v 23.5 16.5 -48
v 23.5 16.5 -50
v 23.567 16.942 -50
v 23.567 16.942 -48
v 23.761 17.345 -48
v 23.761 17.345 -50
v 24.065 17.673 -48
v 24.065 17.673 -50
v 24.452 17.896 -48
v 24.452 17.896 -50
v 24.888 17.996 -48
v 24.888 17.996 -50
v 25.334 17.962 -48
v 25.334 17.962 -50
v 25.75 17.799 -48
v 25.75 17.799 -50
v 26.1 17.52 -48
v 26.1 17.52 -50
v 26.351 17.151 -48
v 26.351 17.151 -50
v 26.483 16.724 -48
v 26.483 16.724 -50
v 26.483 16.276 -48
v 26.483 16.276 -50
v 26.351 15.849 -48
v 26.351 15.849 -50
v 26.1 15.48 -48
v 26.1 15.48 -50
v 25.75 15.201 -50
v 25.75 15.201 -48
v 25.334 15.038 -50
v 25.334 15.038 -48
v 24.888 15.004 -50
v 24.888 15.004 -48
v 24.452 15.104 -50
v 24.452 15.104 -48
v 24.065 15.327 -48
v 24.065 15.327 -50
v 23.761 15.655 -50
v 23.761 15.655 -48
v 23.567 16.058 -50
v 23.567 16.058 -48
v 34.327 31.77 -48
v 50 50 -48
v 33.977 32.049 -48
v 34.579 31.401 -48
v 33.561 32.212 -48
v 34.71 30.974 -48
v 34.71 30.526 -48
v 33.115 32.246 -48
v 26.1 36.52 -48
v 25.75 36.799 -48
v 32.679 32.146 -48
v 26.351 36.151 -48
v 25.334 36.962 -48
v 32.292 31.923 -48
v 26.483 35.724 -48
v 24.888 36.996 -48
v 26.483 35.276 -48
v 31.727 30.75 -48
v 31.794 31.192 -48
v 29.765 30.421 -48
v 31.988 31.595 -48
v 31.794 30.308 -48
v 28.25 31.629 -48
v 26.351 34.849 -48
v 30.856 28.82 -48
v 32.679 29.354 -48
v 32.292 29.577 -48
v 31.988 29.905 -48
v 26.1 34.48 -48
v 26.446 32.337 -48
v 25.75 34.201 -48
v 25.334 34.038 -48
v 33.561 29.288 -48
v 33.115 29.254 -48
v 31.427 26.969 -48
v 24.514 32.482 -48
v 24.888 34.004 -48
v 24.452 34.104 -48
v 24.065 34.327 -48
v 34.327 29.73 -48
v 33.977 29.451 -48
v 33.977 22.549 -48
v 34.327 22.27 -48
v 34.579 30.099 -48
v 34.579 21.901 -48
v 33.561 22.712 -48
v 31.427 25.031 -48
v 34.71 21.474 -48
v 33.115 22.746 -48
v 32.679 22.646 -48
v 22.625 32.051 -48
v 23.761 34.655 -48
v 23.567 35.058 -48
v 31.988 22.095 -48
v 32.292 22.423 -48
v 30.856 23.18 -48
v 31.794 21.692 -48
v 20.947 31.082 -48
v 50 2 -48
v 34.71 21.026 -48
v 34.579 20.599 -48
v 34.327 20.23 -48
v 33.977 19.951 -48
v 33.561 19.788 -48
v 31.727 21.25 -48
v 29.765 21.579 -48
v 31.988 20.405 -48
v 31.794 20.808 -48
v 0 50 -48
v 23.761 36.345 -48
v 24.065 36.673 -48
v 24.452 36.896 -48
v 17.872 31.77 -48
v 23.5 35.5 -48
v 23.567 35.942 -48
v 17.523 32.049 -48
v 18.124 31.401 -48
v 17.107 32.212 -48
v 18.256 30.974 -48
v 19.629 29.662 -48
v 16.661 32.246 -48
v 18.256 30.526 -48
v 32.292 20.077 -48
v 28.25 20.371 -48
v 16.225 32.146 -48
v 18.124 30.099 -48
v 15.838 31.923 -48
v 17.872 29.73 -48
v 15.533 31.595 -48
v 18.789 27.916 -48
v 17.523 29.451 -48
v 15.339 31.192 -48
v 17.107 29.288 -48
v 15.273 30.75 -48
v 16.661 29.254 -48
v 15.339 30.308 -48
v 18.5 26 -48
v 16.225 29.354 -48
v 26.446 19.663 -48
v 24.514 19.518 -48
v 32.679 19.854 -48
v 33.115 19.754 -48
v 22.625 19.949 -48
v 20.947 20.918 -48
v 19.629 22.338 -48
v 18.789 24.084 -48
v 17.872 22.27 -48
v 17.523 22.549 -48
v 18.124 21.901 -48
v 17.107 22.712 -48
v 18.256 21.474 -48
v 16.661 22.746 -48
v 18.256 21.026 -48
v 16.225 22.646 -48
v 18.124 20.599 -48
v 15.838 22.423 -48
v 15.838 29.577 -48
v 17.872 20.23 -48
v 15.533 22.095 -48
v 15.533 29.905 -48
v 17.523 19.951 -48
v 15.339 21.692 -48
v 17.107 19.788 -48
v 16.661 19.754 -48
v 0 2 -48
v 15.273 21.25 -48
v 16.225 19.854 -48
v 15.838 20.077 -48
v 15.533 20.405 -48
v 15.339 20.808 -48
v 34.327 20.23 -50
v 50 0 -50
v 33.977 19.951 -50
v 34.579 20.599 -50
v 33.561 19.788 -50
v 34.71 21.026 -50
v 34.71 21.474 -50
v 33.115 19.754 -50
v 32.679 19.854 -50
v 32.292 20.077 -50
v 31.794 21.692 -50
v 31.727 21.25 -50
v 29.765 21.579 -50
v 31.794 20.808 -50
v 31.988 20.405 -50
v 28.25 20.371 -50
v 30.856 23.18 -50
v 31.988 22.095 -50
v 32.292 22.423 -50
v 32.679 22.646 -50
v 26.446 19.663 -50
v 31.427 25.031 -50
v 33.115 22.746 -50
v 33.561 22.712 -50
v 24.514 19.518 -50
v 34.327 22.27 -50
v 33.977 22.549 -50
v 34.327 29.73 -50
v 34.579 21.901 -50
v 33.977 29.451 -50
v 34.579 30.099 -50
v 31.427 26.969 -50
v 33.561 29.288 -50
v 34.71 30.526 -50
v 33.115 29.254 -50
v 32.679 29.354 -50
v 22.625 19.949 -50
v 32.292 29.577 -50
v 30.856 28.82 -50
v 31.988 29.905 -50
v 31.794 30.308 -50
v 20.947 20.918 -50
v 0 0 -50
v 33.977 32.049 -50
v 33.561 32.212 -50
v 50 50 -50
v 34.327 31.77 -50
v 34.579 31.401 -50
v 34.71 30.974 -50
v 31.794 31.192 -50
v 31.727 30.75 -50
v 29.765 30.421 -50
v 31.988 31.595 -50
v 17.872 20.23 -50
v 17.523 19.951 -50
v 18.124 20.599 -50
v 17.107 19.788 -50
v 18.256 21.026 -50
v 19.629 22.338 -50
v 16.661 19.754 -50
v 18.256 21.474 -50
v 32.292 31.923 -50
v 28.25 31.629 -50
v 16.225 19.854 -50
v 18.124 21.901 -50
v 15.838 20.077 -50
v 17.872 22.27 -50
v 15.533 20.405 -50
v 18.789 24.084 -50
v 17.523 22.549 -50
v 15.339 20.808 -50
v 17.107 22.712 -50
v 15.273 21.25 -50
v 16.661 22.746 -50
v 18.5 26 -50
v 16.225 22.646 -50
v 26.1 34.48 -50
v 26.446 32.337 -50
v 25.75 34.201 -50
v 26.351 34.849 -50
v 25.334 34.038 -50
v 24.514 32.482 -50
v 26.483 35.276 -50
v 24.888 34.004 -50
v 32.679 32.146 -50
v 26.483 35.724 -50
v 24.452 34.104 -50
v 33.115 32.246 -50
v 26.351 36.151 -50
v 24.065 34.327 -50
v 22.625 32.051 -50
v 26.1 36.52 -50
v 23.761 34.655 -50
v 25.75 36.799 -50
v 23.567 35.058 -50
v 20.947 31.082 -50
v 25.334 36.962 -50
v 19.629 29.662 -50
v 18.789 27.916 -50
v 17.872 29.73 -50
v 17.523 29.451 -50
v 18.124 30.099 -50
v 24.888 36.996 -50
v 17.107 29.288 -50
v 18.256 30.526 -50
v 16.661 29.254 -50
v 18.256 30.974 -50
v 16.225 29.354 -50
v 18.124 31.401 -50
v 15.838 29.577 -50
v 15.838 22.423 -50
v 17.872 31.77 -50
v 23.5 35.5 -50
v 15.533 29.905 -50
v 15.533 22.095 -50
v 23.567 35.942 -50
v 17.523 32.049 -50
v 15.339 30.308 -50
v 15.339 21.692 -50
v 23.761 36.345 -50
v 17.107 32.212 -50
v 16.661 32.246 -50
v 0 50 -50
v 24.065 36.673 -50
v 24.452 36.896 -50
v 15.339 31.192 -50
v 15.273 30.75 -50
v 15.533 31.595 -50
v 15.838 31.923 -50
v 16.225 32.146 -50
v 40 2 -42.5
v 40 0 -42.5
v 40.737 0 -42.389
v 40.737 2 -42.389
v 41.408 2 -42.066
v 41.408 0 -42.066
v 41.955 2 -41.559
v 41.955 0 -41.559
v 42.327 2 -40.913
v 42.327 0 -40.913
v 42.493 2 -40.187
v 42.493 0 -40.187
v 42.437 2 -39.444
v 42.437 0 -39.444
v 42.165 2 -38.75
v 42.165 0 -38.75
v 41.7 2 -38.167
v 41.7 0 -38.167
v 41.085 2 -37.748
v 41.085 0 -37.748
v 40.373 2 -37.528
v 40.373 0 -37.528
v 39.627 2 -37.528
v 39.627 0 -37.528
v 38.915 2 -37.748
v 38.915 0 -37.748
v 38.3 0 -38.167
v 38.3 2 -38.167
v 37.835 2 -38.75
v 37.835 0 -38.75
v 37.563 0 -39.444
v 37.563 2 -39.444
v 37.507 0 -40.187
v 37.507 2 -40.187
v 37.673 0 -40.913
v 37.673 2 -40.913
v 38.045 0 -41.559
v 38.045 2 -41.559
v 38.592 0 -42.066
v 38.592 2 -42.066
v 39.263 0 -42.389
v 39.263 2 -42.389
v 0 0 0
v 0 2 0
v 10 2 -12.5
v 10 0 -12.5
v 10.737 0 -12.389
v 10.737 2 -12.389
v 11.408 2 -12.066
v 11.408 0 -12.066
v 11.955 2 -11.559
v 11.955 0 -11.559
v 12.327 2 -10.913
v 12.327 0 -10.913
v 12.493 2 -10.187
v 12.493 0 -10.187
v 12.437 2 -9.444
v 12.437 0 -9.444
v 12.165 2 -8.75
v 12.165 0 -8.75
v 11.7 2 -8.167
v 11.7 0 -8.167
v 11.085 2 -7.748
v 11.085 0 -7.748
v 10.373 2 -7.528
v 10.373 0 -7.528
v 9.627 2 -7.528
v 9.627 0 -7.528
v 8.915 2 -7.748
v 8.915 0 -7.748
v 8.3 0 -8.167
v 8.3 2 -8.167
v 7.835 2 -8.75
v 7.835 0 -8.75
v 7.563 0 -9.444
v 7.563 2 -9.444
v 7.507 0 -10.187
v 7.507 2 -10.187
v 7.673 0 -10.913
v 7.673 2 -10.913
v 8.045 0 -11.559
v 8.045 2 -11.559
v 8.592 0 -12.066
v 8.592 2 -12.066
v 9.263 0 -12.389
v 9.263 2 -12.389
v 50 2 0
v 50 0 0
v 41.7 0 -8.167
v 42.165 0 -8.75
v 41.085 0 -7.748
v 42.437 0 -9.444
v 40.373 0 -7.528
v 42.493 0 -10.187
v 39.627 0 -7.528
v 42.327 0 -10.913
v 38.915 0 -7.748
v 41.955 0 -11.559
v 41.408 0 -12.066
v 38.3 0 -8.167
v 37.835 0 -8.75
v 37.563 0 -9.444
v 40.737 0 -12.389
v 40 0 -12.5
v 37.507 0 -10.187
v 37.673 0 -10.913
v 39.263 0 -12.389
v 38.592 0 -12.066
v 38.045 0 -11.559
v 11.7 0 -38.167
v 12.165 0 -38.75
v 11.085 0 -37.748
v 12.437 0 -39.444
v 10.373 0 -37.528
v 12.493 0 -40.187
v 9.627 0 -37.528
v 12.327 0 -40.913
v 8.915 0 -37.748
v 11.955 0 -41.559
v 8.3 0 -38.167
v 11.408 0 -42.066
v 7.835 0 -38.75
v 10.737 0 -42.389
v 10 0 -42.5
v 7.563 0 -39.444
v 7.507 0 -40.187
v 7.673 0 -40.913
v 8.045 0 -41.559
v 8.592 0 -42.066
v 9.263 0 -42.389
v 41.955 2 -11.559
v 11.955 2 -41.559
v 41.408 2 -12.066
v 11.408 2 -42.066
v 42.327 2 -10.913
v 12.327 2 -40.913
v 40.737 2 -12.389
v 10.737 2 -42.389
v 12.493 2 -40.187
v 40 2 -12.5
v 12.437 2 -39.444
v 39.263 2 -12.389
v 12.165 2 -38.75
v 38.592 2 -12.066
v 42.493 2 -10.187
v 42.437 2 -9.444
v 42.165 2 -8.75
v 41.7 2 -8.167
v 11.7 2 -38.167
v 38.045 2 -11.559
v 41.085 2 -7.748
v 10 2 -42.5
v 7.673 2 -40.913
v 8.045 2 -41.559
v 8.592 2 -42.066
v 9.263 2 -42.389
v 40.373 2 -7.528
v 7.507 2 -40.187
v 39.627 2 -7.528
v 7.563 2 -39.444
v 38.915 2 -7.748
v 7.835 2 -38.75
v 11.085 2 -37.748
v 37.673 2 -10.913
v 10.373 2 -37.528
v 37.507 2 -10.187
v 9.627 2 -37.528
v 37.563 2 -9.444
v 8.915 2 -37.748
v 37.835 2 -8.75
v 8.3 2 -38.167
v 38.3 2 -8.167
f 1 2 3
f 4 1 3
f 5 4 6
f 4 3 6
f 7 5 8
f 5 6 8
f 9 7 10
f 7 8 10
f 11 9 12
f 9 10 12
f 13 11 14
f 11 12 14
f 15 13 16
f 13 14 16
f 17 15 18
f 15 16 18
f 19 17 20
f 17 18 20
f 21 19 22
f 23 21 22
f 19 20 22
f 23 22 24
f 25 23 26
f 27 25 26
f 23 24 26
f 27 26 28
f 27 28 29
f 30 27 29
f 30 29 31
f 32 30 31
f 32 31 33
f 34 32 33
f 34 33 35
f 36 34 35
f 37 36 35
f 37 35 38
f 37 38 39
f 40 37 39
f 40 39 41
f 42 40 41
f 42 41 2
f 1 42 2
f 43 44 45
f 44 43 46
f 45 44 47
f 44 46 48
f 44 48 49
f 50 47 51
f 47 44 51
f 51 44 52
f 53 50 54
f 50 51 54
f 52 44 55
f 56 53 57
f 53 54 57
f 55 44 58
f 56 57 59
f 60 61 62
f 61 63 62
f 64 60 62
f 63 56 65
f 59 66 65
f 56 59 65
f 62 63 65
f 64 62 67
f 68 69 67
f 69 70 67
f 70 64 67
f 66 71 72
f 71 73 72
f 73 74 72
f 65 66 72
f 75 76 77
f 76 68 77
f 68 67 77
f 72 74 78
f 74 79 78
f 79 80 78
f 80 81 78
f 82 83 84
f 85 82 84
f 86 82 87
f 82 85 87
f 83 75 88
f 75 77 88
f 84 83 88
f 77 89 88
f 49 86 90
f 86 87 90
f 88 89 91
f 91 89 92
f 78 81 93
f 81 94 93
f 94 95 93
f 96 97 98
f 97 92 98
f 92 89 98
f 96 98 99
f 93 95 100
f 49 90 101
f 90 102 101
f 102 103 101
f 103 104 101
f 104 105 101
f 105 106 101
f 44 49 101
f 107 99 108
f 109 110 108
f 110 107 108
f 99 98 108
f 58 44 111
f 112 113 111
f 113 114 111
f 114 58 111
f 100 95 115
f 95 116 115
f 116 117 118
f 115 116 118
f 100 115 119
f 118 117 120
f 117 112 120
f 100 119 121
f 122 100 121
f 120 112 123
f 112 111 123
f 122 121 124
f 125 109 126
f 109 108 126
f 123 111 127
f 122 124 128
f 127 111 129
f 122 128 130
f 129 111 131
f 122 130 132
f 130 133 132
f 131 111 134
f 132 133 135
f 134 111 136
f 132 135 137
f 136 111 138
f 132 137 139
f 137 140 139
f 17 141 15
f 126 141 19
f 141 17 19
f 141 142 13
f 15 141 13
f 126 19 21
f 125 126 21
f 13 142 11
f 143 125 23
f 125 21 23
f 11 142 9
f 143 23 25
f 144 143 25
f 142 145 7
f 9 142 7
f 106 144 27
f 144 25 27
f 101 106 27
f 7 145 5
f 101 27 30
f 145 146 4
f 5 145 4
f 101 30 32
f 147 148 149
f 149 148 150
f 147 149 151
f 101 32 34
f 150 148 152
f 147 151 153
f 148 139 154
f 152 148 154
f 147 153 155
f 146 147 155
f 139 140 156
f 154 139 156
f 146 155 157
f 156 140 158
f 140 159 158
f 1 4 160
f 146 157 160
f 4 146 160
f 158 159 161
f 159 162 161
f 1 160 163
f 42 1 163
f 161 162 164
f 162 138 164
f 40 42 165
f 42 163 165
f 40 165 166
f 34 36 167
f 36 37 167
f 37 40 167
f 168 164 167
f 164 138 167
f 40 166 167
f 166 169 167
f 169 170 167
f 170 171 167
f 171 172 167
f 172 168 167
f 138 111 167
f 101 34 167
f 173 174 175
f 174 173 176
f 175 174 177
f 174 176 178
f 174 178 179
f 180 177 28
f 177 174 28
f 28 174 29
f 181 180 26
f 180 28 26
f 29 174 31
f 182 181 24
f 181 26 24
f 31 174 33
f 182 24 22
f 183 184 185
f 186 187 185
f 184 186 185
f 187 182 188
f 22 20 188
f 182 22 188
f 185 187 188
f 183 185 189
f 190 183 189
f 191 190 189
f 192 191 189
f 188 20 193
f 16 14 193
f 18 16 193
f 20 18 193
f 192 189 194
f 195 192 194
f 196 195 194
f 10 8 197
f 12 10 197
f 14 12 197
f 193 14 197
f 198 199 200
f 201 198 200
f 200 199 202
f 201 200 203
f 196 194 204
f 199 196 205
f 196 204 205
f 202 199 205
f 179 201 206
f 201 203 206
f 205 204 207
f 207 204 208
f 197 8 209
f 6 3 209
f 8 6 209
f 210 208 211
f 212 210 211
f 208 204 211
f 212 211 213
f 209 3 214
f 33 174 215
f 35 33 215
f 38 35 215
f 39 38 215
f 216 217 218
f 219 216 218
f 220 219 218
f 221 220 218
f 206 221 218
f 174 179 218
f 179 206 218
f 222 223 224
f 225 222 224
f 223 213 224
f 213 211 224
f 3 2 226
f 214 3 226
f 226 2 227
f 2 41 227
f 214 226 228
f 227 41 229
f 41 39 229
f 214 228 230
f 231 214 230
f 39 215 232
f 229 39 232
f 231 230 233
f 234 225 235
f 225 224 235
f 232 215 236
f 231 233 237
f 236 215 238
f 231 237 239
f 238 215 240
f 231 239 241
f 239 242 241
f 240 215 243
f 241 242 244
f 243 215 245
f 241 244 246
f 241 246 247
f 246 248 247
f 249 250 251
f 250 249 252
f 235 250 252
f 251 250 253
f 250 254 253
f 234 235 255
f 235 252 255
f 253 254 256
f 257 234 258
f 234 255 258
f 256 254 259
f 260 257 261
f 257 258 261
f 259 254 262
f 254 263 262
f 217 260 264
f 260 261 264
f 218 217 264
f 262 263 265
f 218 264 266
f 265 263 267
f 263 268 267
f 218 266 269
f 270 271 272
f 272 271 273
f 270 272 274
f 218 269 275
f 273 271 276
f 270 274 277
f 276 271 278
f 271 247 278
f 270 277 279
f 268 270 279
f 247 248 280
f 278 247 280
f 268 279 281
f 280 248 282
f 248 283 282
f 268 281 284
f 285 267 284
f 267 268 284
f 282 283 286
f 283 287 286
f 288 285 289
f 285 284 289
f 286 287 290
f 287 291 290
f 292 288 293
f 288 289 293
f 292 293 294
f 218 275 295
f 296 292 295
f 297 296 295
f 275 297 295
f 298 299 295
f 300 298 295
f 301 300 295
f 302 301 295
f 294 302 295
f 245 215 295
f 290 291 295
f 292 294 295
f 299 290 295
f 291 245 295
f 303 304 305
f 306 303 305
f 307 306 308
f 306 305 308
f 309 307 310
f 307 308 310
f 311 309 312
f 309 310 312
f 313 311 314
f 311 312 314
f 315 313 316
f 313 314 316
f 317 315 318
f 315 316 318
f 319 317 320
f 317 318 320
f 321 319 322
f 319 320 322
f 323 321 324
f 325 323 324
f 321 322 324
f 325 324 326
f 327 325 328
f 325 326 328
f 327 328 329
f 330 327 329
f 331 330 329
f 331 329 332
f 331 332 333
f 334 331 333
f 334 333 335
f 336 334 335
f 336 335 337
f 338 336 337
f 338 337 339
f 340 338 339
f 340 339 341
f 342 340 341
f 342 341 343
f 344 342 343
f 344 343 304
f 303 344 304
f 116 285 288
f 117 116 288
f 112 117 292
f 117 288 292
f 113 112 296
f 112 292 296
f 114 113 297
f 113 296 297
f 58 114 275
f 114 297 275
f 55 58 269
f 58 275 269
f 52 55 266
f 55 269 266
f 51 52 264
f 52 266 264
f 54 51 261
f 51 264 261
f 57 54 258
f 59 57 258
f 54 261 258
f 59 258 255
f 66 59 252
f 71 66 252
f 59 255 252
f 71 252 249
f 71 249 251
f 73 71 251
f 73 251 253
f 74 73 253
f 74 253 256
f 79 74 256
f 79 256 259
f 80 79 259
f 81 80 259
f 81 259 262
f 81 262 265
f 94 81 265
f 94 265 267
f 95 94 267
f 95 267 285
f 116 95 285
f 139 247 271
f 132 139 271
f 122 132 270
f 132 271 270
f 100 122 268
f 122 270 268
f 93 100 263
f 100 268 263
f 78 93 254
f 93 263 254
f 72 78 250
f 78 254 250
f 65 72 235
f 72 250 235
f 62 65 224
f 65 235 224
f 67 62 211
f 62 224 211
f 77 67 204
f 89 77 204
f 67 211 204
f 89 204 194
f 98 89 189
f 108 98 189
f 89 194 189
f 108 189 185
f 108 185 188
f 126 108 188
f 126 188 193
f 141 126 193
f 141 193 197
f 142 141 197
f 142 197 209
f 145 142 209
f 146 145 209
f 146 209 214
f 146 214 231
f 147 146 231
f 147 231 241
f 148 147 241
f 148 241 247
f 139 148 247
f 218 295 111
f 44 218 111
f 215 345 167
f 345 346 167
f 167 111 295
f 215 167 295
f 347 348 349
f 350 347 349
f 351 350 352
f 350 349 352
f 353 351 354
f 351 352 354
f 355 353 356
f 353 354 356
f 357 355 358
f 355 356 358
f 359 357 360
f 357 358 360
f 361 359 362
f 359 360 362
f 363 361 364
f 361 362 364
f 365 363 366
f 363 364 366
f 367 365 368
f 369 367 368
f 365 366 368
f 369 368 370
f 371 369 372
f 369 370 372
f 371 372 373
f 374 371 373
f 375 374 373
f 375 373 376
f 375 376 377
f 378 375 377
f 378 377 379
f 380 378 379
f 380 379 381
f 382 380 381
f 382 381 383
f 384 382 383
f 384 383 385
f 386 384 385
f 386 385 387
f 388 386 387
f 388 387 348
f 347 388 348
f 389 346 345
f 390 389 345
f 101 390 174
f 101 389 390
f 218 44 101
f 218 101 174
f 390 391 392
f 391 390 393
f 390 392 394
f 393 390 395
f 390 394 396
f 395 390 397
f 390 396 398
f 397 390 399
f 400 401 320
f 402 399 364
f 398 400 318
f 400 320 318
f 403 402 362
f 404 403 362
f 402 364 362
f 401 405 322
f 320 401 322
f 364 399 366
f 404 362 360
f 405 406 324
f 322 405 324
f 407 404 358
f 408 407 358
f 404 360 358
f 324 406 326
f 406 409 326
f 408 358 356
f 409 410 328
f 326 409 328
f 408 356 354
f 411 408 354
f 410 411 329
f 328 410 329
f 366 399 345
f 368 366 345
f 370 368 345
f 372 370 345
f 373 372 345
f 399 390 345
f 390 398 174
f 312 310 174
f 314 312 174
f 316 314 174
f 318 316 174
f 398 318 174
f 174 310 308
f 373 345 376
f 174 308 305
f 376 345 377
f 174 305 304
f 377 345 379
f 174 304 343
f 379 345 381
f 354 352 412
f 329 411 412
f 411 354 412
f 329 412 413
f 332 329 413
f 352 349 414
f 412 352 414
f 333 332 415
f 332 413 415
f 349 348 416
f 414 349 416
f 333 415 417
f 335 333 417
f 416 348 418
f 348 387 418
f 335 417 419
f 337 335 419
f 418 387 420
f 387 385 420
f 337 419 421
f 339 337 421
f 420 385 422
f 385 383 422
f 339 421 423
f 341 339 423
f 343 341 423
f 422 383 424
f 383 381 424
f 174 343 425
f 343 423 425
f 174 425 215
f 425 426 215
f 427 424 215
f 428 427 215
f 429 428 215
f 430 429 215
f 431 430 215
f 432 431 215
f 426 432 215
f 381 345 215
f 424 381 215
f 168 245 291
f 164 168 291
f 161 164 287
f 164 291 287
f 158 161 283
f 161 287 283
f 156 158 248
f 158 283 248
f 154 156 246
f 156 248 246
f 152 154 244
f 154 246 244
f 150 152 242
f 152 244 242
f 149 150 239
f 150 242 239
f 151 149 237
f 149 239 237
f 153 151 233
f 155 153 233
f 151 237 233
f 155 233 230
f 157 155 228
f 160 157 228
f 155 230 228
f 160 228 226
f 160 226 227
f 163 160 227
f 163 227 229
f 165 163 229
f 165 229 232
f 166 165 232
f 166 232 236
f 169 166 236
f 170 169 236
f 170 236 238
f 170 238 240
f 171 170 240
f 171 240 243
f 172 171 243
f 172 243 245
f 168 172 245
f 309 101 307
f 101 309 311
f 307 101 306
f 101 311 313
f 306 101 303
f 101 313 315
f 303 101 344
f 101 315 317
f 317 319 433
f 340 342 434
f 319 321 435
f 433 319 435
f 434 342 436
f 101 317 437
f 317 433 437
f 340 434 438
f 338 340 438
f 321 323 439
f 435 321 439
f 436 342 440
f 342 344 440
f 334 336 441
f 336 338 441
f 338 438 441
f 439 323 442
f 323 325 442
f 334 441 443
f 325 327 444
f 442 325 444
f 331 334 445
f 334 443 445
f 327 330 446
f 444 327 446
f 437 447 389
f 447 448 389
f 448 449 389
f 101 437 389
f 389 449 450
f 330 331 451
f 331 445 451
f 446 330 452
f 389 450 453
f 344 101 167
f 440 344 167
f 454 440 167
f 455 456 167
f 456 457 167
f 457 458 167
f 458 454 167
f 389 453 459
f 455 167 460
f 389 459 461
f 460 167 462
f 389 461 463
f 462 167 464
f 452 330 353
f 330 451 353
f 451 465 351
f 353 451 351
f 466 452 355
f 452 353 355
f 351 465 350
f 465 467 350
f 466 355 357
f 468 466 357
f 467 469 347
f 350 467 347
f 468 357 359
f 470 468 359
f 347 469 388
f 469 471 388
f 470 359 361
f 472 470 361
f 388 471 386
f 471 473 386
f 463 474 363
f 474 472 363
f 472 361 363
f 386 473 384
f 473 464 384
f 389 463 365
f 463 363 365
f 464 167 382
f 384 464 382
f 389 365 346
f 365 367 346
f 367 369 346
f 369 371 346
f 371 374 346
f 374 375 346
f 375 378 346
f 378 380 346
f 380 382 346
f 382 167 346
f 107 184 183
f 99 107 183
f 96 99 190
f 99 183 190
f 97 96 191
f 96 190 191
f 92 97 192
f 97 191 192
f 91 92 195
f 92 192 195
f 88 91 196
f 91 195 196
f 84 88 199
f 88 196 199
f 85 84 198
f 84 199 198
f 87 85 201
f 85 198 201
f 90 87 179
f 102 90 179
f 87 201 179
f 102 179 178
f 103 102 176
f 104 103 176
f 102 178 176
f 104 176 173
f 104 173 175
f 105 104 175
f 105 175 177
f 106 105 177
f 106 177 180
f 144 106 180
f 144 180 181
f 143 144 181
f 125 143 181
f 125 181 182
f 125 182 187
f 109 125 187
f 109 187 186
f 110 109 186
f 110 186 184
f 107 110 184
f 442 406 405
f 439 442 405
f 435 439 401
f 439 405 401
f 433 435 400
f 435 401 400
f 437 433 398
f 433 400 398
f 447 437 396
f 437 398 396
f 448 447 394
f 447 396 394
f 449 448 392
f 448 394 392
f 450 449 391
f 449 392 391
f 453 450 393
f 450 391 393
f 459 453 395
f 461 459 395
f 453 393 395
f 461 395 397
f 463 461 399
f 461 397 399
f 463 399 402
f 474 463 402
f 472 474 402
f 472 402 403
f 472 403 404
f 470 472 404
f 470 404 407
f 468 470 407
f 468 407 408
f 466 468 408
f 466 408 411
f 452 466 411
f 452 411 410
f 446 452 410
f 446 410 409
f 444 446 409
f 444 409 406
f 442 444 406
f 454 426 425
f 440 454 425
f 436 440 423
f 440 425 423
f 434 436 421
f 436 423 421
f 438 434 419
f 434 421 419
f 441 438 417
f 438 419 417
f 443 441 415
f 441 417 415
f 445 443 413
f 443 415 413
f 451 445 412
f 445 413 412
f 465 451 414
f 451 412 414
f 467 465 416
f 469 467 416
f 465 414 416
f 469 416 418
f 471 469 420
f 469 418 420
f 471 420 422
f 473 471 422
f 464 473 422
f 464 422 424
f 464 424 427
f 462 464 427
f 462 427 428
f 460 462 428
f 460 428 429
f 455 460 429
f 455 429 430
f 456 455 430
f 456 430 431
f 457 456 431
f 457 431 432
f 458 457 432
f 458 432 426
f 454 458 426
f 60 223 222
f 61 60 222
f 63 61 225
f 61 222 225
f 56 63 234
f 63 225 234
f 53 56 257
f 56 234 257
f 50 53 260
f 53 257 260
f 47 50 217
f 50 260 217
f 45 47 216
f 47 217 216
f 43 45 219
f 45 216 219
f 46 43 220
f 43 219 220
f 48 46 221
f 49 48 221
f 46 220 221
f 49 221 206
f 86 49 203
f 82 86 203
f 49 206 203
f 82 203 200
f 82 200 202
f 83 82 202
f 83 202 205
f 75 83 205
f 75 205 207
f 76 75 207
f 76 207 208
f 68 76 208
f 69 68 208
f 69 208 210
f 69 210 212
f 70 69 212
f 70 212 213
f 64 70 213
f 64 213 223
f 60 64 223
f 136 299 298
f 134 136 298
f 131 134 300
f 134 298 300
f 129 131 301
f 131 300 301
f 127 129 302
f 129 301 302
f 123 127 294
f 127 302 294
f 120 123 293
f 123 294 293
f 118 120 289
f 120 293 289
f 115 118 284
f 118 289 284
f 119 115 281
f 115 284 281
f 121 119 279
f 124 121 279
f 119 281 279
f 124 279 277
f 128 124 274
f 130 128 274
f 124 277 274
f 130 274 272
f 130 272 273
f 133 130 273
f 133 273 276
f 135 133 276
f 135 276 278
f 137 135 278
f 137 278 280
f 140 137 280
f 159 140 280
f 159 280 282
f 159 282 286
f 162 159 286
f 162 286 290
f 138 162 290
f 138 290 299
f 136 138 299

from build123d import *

# Parameters (mm, degrees)
EXTRUDE_1_DEPTH     = 50
SKETCH_3_R          = 6.5
SKETCH_3_R_2        = 1.5
CUT_EXTRUDE_1_DEPTH = 50
SKETCH_4_R          = 2.5
CUT_EXTRUDE_2_DEPTH = 50


with BuildPart() as part:
    # 草图2 → 凸台-拉伸1 (new body)
    with BuildSketch(Plane(origin=(0, 0, 0), x_dir=(0, 0, -1), z_dir=(1, 0, 0))):
        Polygon((0, 0), (50, 0), (50, 50), (48, 50), (48, 2), (0, 2), align=None)
    extrude(amount=EXTRUDE_1_DEPTH)

    # 草图3 → 切除-拉伸1 (cut)
    with BuildSketch(Plane(origin=(0, 0, -50), x_dir=(-1, 0, 0), z_dir=(0, 0, -1))):
        with Locations((-25, 26)):
            Circle(SKETCH_3_R)
        with Locations((-25, 35.5)):
            Circle(SKETCH_3_R_2)
        with Locations((-16.772758664, 30.75)):
            Circle(SKETCH_3_R_2)
        with Locations((-16.772758664, 21.25)):
            Circle(SKETCH_3_R_2)
        with Locations((-25, 16.5)):
            Circle(SKETCH_3_R_2)
        with Locations((-33.227241336, 21.25)):
            Circle(SKETCH_3_R_2)
        with Locations((-33.227241336, 30.75)):
            Circle(SKETCH_3_R_2)
    extrude(amount=-CUT_EXTRUDE_1_DEPTH, mode=Mode.SUBTRACT)

    # 草图4 → 切除-拉伸2 (cut)
    with BuildSketch(Plane.XZ):
        with Locations(Location((10, -10, 0), (0, 0, 270))):
            Circle(SKETCH_4_R)
        with Locations(Location((40, -10, 0), (0, 0, 270))):
            Circle(SKETCH_4_R)
        with Locations(Location((10, -40, 0), (0, 0, 270))):
            Circle(SKETCH_4_R)
        with Locations(Location((40, -40, 0), (0, 0, 270))):
            Circle(SKETCH_4_R)
    extrude(amount=-CUT_EXTRUDE_2_DEPTH, mode=Mode.SUBTRACT)


solid = part.part
